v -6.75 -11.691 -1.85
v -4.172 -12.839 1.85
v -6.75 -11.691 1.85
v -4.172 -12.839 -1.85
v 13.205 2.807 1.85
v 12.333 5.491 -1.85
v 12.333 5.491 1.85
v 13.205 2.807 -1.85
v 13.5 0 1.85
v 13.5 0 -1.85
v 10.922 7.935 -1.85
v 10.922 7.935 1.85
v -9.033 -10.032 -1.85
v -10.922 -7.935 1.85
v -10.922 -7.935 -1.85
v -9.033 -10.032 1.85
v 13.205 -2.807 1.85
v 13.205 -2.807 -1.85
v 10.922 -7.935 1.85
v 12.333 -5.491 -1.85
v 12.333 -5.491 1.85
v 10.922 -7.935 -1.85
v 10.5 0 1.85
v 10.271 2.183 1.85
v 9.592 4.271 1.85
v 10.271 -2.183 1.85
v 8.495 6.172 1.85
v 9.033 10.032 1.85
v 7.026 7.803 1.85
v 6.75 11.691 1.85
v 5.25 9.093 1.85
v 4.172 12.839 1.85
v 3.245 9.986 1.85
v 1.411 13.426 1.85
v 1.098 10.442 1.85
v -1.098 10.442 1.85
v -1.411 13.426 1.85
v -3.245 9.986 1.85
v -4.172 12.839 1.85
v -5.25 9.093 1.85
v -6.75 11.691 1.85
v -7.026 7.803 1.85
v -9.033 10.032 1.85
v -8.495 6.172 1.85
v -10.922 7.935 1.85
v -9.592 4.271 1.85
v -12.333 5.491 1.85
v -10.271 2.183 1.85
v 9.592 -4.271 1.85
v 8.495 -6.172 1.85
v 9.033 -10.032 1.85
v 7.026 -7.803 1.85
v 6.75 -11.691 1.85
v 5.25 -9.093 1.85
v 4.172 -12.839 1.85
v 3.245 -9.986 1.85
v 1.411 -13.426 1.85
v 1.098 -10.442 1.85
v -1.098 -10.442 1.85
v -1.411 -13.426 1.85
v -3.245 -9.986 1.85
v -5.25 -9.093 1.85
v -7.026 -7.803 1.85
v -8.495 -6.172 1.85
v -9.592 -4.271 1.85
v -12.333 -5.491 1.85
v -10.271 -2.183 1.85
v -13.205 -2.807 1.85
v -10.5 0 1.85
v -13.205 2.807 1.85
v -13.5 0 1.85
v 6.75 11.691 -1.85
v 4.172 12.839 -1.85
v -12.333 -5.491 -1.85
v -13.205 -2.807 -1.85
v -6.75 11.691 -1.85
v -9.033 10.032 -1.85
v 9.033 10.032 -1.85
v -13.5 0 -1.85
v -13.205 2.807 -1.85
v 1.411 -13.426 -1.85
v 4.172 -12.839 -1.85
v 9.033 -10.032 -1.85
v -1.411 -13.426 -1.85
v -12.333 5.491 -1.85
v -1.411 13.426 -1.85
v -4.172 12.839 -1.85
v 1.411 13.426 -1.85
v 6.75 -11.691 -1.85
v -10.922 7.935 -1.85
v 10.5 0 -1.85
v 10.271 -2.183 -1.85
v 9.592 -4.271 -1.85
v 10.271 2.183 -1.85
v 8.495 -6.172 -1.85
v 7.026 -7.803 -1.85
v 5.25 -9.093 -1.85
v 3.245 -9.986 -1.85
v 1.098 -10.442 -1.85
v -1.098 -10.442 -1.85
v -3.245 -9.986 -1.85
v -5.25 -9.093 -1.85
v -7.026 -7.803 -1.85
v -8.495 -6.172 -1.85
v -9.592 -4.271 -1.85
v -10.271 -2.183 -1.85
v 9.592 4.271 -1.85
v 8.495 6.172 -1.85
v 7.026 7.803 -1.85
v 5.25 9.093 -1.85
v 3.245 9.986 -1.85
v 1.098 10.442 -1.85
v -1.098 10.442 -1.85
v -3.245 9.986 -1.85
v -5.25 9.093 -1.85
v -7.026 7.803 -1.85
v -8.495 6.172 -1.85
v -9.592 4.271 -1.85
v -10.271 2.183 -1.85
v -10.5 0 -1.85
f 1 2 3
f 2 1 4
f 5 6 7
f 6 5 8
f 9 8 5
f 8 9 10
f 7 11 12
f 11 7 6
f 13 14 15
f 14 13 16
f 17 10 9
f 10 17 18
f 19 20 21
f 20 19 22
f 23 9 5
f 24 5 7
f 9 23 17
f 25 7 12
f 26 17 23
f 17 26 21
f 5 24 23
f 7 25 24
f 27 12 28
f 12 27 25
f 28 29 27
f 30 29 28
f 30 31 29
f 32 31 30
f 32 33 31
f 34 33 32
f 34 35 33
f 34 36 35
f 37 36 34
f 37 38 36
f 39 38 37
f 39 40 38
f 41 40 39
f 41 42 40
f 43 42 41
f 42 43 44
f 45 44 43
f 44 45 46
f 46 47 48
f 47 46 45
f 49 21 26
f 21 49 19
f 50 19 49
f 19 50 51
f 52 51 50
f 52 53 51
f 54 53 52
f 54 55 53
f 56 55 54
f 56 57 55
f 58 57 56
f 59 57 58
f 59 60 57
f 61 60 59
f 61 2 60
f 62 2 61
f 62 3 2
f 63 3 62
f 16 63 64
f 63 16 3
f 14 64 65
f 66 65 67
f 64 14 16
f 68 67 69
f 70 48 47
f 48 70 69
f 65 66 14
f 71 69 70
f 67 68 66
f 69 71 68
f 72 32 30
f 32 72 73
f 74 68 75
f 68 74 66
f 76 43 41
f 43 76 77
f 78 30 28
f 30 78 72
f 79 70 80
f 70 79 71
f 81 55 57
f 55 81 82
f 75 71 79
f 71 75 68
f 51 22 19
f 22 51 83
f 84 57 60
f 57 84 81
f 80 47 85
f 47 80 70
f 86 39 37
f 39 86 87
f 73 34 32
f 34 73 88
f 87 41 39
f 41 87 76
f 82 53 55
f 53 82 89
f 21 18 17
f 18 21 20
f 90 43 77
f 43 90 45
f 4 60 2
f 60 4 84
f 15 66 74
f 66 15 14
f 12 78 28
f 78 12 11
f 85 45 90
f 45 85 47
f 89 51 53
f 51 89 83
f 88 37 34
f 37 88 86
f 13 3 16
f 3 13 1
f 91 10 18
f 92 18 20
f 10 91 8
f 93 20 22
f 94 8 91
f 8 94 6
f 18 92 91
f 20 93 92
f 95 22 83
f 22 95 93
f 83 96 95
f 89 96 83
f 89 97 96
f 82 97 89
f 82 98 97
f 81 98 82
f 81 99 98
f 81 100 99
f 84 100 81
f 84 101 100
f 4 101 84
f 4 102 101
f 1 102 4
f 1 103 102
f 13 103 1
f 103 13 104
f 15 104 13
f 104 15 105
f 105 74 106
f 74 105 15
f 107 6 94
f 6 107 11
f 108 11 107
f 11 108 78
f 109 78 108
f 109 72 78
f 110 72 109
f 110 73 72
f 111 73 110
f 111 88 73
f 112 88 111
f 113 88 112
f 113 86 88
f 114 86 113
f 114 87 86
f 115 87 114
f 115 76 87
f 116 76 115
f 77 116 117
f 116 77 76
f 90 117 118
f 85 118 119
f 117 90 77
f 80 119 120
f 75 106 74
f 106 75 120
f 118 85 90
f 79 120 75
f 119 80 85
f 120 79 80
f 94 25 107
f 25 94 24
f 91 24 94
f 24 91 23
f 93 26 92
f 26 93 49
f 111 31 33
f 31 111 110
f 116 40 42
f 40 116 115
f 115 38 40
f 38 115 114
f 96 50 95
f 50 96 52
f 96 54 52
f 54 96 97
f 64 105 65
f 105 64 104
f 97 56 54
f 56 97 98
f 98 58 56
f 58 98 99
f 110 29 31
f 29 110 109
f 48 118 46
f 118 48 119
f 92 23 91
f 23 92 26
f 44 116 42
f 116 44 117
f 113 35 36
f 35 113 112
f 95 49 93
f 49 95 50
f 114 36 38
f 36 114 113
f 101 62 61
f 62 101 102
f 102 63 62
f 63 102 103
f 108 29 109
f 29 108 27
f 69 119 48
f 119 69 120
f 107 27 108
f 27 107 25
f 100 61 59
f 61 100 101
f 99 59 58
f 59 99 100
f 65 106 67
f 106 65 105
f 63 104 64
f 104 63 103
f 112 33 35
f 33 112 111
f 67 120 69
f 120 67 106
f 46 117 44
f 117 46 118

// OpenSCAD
// Parameters
outer_radius = 13.5; //[6.75:27:0.1]
inner_radius = 10.5; //[5.25:21:0.1]
height = 3.7; //[1.85:7.4:0.1]
edge_chamfer = 0.6; //[0.3:1.2:0.05]
edge_fillet = 0.5; //[0.25:1:0.05]
overlap = 0.8; //[0.5:2:0.1]

// Base Shapes
module annular_outer_cyl() {
  cylinder(h=height, r=outer_radius, center=true);
}

module annular_inner_hole_cyl() {
  cylinder(h=height + 2*overlap, r=inner_radius, center=true);
}

module edge_chamfer_cut_cone() {
  translate([0, 0, height/2 - edge_chamfer + overlap/2])
    cylinder(h=edge_chamfer*2, r1=outer_radius + edge_chamfer, r2=outer_radius - edge_chamfer, center=true);
}

module edge_fillet_cut_torus() {
  translate([0, 0, -height/2 + edge_fillet - overlap/2])
    rotate_extrude() translate([outer_radius - edge_fillet, 0, 0]) circle(r=edge_fillet);
}

// Operations
module annular_body() {
  difference() {
    annular_outer_cyl();
    annular_inner_hole_cyl();
  }
}

module annular_with_chamfer() {
  difference() {
    annular_body();
    edge_chamfer_cut_cone();
  }
}

module edge_fillet() {
  difference() {
    annular_with_chamfer();
    edge_fillet_cut_torus();
  }
}

module edge_chamfer() {
  union() {
    annular_body();
    annular_with_chamfer();
  }
}

module complete_model() {
  union() {
    edge_fillet();
    edge_chamfer();
  }
}

// Final Output
complete_model();
